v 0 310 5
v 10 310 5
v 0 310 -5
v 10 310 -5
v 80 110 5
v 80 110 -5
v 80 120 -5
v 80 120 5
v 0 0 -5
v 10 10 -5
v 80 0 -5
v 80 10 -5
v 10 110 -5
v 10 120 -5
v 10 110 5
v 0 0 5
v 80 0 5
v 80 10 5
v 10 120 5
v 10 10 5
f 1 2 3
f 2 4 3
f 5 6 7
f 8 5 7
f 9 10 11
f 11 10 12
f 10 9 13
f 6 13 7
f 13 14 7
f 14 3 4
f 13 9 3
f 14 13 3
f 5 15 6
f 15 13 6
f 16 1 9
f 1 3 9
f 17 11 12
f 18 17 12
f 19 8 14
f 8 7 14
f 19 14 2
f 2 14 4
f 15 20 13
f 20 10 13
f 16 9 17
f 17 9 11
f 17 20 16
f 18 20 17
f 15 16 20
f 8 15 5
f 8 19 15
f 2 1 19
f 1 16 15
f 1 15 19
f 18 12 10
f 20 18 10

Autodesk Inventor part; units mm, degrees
ref_plane "YZ Plane" through (0, 0, 0) normal (1, 0, 0) x (0, 1, 0)
ref_plane "XZ Plane" through (0, 0, 0) normal (0, 1, 0) x (-1, 0, 0)
ref_plane "XY Plane" through (0, 0, 0) normal (0, 0, 1) x (1, 0, 0)
sketch "Sketch2" plane through (0, 0, 0) normal (0, 0, 1) x (1, 0, 0)
  line L0 (0, 310) -> (0, 0)
  line L1 (0, 0) -> (10, 0)
  line L2 (10, 0) -> (10, 0)
  line L3 (10, 0) -> (80, 0)
  line L4 (80, 0) -> (80, 10)
  line L5 (80, 10) -> (10, 10)
  line L6 (10, 10) -> (10, 110)
  line L7 (10, 110) -> (80, 110)
  line L8 (80, 110) -> (80, 120)
  line L9 (80, 120) -> (10, 120)
  line L10 (10, 120) -> (10, 310)
  line L11 (10, 310) -> (0, 310)
  dimension "d12" = 100
  dimension "d13" = 10
  dimension "d14" = 10
  dimension "d15" = 10
  dimension "d16" = 10
  dimension "d17" = 190
  dimension "d18" = 310
  dimension "d19" = 80
extrude "Extrusion2" add sketch "Sketch2" along normal mid plane 10
properties part number "support" material "Steel"
